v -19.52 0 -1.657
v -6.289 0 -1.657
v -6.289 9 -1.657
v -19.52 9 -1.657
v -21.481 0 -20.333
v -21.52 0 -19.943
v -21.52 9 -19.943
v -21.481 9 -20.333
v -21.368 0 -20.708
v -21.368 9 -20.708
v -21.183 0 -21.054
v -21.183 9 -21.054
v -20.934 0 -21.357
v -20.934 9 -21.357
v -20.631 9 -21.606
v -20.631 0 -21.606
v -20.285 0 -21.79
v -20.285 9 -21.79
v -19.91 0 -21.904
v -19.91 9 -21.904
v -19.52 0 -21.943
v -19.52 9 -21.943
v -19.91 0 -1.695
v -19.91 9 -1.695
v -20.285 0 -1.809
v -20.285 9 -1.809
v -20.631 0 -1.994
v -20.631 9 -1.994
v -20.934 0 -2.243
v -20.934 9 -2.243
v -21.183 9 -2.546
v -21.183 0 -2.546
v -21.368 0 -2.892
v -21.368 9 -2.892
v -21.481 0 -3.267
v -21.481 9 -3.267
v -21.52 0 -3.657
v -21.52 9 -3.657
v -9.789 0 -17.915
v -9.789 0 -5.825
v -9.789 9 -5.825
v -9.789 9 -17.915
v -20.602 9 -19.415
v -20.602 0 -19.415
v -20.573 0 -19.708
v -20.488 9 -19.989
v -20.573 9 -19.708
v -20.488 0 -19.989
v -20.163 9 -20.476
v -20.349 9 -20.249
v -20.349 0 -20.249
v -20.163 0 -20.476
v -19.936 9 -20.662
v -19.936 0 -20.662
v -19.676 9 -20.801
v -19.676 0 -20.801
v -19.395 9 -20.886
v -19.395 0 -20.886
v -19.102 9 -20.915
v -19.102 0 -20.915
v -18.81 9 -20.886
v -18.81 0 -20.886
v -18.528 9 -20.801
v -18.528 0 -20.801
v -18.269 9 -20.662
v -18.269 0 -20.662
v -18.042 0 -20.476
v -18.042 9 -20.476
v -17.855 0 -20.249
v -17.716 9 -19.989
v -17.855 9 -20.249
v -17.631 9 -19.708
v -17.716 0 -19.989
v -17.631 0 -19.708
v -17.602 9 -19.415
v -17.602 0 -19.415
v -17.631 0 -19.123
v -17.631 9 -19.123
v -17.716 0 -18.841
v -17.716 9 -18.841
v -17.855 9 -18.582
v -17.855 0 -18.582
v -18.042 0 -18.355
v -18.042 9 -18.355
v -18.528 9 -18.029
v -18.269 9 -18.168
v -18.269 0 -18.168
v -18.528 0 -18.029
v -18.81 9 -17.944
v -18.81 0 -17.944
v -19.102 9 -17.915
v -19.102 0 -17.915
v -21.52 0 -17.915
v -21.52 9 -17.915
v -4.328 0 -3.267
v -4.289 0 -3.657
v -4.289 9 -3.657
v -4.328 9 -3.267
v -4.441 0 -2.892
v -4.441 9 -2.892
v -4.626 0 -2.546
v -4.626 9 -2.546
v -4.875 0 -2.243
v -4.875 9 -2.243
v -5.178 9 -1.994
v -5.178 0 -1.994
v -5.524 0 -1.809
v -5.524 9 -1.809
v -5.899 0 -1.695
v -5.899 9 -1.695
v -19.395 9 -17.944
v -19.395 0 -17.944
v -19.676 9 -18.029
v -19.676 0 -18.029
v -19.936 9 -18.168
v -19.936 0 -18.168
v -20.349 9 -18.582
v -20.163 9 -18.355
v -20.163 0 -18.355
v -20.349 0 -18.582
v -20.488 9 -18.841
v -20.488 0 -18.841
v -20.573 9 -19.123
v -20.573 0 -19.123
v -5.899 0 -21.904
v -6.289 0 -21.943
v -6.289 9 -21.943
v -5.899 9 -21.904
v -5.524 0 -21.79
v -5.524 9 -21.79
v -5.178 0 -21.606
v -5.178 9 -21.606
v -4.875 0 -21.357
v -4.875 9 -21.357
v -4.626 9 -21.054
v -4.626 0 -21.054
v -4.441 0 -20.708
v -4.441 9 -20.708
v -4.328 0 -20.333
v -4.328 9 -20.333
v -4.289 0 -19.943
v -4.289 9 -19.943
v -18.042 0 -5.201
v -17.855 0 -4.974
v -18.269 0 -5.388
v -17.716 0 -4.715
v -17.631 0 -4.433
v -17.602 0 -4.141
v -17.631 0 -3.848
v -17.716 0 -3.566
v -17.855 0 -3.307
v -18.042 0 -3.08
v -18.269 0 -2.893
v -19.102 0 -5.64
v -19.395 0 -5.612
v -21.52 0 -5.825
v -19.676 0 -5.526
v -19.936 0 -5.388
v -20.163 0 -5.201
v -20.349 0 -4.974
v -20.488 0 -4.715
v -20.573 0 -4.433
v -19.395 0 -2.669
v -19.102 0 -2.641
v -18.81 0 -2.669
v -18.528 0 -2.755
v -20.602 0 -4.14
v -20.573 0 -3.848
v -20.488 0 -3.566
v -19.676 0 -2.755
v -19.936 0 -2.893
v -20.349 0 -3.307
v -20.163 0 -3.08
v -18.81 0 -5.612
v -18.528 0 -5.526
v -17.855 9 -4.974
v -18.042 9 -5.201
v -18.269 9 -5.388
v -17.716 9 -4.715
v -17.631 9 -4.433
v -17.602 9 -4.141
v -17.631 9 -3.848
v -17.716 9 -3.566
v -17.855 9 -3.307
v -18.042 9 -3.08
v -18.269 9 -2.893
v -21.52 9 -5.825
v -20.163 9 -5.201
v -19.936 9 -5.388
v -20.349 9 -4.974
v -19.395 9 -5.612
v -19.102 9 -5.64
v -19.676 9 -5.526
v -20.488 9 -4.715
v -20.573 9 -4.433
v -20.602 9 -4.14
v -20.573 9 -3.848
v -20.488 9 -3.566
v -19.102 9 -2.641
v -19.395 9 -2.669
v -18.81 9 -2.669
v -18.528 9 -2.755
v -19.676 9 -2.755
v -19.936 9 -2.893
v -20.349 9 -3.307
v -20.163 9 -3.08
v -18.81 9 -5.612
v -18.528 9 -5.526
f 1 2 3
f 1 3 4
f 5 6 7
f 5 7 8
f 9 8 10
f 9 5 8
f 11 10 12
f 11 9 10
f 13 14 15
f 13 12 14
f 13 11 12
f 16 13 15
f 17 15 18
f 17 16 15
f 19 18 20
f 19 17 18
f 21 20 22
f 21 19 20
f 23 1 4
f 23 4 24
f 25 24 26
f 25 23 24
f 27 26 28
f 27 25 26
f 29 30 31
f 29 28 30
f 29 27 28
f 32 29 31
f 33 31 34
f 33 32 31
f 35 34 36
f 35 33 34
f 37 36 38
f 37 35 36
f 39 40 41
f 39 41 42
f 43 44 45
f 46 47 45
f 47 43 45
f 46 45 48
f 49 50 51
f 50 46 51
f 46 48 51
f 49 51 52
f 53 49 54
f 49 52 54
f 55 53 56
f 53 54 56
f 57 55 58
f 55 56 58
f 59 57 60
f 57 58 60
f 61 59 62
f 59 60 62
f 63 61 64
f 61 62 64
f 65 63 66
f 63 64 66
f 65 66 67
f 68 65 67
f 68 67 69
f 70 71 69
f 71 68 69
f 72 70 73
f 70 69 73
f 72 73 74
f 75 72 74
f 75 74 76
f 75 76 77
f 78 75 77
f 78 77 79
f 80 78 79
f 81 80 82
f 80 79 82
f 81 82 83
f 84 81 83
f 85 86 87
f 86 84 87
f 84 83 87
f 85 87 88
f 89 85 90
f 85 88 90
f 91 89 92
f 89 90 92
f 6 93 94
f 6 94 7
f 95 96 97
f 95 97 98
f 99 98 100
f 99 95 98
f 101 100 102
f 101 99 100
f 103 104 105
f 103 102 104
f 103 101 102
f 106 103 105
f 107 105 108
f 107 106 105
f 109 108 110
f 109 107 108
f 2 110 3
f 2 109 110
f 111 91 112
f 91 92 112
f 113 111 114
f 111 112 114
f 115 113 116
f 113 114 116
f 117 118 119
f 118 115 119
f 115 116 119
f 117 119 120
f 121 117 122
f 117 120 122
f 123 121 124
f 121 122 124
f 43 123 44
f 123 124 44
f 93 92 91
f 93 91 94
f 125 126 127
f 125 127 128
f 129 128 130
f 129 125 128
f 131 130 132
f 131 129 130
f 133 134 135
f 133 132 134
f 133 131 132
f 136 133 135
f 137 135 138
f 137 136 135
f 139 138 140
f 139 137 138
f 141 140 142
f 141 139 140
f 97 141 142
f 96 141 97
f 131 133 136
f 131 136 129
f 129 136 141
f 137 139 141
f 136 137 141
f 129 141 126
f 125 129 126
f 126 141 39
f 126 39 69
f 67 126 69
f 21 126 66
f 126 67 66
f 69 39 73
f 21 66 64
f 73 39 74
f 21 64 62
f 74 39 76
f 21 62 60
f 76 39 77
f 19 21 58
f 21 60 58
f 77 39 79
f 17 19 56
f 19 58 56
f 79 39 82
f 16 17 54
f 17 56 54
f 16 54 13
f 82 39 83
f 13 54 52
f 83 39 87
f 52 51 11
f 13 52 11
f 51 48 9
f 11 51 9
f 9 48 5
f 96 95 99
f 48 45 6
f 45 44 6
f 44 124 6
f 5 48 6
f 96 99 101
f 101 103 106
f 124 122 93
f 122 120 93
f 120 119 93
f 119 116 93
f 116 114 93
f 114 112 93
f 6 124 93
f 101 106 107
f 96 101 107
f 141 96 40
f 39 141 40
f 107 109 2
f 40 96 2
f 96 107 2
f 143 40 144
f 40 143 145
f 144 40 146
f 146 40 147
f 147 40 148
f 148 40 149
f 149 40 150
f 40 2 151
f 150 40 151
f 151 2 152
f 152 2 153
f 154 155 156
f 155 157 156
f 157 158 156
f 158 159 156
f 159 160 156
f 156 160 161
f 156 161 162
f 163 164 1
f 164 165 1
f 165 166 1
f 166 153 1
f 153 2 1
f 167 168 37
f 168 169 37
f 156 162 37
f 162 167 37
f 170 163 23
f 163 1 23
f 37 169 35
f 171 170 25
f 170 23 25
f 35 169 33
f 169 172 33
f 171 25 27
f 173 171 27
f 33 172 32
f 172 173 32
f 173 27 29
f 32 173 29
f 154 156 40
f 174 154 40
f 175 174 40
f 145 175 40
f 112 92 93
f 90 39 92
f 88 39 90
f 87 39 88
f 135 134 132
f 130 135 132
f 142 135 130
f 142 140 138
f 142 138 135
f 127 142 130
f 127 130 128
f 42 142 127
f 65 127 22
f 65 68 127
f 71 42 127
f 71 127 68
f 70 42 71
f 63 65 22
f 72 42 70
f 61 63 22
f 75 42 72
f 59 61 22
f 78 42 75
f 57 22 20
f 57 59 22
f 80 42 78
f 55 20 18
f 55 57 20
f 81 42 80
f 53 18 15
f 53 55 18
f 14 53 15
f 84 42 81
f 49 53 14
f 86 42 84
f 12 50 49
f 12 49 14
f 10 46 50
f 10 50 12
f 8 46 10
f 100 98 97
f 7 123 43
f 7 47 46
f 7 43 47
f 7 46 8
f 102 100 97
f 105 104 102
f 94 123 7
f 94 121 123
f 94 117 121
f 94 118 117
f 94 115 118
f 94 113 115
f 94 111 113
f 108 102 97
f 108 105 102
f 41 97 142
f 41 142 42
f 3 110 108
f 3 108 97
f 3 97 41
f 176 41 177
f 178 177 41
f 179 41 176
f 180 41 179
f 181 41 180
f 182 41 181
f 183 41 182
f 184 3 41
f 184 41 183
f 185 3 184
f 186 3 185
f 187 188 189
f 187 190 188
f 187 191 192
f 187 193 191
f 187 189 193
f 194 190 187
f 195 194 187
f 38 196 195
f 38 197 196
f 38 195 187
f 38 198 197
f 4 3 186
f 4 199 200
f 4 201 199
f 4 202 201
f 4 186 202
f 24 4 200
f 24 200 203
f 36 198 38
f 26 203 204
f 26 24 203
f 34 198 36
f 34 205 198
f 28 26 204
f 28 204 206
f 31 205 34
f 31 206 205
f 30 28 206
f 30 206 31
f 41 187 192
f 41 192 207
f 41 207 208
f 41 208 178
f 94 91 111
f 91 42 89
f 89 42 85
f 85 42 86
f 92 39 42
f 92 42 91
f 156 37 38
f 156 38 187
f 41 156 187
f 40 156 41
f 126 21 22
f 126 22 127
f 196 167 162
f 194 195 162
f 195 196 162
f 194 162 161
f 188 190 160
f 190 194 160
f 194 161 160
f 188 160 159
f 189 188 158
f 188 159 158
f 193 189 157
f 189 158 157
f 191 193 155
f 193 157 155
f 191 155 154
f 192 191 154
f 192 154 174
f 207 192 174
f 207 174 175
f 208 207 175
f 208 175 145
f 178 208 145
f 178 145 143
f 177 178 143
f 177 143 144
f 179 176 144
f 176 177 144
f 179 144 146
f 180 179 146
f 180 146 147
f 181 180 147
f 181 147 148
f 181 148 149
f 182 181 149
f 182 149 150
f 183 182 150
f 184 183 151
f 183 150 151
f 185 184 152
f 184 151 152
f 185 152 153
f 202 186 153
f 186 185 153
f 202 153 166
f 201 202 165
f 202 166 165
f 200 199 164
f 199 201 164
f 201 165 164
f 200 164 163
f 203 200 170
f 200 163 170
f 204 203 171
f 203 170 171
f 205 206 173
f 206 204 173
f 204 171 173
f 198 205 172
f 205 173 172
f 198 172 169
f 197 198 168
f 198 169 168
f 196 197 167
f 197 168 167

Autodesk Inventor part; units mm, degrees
ref_plane "YZ Plane" through (0, 0, 0) normal (1, 0, 0) x (0, 1, 0)
ref_plane "XZ Plane" through (0, 0, 0) normal (0, 1, 0) x (-1, 0, 0)
ref_plane "XY Plane" through (0, 0, 0) normal (0, 0, 1) x (1, 0, 0)
sketch "Sketch1" plane through (0, 0, 0) normal (0, 1, 0) x (-1, 0, 0)
  spline S0 degree 3 poles (19.0088, -20.3781) (18.4587, -20.3781) (18.0142, -19.9334) (18.0142, -19.3832) (18.0142, -18.833) (18.4587, -18.3883) (19.0088, -18.3883) (19.5594, -18.3883) (20.0038, -18.833) (20.0038, -19.3832) (20.0038, -19.9334) (19.5594, -20.3781) (19.0088, -20.3781) knots 0 0 0 0 1 1 1 2 2 2 3 3 3 4 4 4 4
  line L0 (19.0088, -20.3781) -> (18.4587, -20.3781) construction
  line L1 (18.4587, -20.3781) -> (18.0142, -19.9334) construction
  line L2 (18.0142, -19.9334) -> (18.0142, -19.3832) construction
  line L3 (18.0142, -19.3832) -> (18.0142, -18.833) construction
  line L4 (18.0142, -18.833) -> (18.4587, -18.3883) construction
  line L5 (18.4587, -18.3883) -> (19.0088, -18.3883) construction
  line L6 (19.0088, -18.3883) -> (19.5594, -18.3883) construction
  line L7 (19.5594, -18.3883) -> (20.0038, -18.833) construction
  line L8 (20.0038, -18.833) -> (20.0038, -19.3832) construction
  line L9 (20.0038, -19.3832) -> (20.0038, -19.9334) construction
  line L10 (20.0038, -19.9334) -> (19.5594, -20.3781) construction
  line L11 (19.5594, -20.3781) -> (19.0088, -20.3781) construction
  spline S1 degree 3 poles (19.0088, -20.3781) (18.4587, -20.3781) (18.0142, -19.9334) (18.0142, -19.3832) (18.0142, -18.833) (18.4587, -18.3883) (19.0088, -18.3883) (19.5594, -18.3883) (20.0038, -18.833) (20.0038, -19.3832) (20.0038, -19.9334) (19.5594, -20.3781) (19.0088, -20.3781) knots 0 0 0 0 1 1 1 2 2 2 3 3 3 4 4 4 4
  line L12 (19.0088, -20.3781) -> (18.4587, -20.3781) construction
  line L13 (18.4587, -20.3781) -> (18.0142, -19.9334) construction
  line L14 (18.0142, -19.9334) -> (18.0142, -19.3832) construction
  line L15 (18.0142, -19.3832) -> (18.0142, -18.833) construction
  line L16 (18.0142, -18.833) -> (18.4587, -18.3883) construction
  line L17 (18.4587, -18.3883) -> (19.0088, -18.3883) construction
  line L18 (19.0088, -18.3883) -> (19.5594, -18.3883) construction
  line L19 (19.5594, -18.3883) -> (20.0038, -18.833) construction
  line L20 (20.0038, -18.833) -> (20.0038, -19.3832) construction
  line L21 (20.0038, -19.3832) -> (20.0038, -19.9334) construction
  line L22 (20.0038, -19.9334) -> (19.5594, -20.3781) construction
  line L23 (19.5594, -20.3781) -> (19.0088, -20.3781) construction
  spline S2 degree 3 poles (19.0088, -5.1804) (18.4587, -5.1804) (18.0142, -4.7359) (18.0142, -4.1855) (18.0142, -3.6352) (18.4587, -3.1907) (19.0088, -3.1907) (19.5594, -3.1907) (20.0038, -3.6352) (20.0038, -4.1855) (20.0038, -4.7359) (19.5594, -5.1804) (19.0088, -5.1804) knots 0 0 0 0 1 1 1 2 2 2 3 3 3 4 4 4 4
  line L24 (19.0088, -5.1804) -> (18.4587, -5.1804) construction
  line L25 (18.4587, -5.1804) -> (18.0142, -4.7359) construction
  line L26 (18.0142, -4.7359) -> (18.0142, -4.1855) construction
  line L27 (18.0142, -4.1855) -> (18.0142, -3.6352) construction
  line L28 (18.0142, -3.6352) -> (18.4587, -3.1907) construction
  line L29 (18.4587, -3.1907) -> (19.0088, -3.1907) construction
  line L30 (19.0088, -3.1907) -> (19.5594, -3.1907) construction
  line L31 (19.5594, -3.1907) -> (20.0038, -3.6352) construction
  line L32 (20.0038, -3.6352) -> (20.0038, -4.1855) construction
  line L33 (20.0038, -4.1855) -> (20.0038, -4.7359) construction
  line L34 (20.0038, -4.7359) -> (19.5594, -5.1804) construction
  line L35 (19.5594, -5.1804) -> (19.0088, -5.1804) construction
  spline S3 degree 3 poles (19.0088, -5.1804) (18.4587, -5.1804) (18.0142, -4.7359) (18.0142, -4.1855) (18.0142, -3.6352) (18.4587, -3.1907) (19.0088, -3.1907) (19.5594, -3.1907) (20.0038, -3.6352) (20.0038, -4.1855) (20.0038, -4.7359) (19.5594, -5.1804) (19.0088, -5.1804) knots 0 0 0 0 1 1 1 2 2 2 3 3 3 4 4 4 4
  line L36 (19.0088, -5.1804) -> (18.4587, -5.1804) construction
  line L37 (18.4587, -5.1804) -> (18.0142, -4.7359) construction
  line L38 (18.0142, -4.7359) -> (18.0142, -4.1855) construction
  line L39 (18.0142, -4.1855) -> (18.0142, -3.6352) construction
  line L40 (18.0142, -3.6352) -> (18.4587, -3.1907) construction
  line L41 (18.4587, -3.1907) -> (19.0088, -3.1907) construction
  line L42 (19.0088, -3.1907) -> (19.5594, -3.1907) construction
  line L43 (19.5594, -3.1907) -> (20.0038, -3.6352) construction
  line L44 (20.0038, -3.6352) -> (20.0038, -4.1855) construction
  line L45 (20.0038, -4.1855) -> (20.0038, -4.7359) construction
  line L46 (20.0038, -4.7359) -> (19.5594, -5.1804) construction
  line L47 (19.5594, -5.1804) -> (19.0088, -5.1804) construction
  line L48 (19.0302, -21.9233) -> (19.4746, -21.9019)
  spline S4 degree 3 poles (19.4746, -21.9019) (20.5647, -21.6366) (21.3157, -20.9538) (21.5279, -19.8276) knots 1 1 1 1 2 2 2 2
  line L49 (19.4746, -21.9019) -> (20.5647, -21.6366) construction
  line L50 (20.5647, -21.6366) -> (21.3157, -20.9538) construction
  line L51 (21.3157, -20.9538) -> (21.5279, -19.8276) construction
  line L52 (21.5279, -19.8276) -> (21.5703, -19.4042)
  line L53 (21.5703, -19.4042) -> (21.5703, -4.1855)
  line L54 (21.5703, -4.1855) -> (21.5279, -3.7411)
  spline S5 degree 3 poles (21.5279, -3.7411) (21.3143, -2.6778) (20.5474, -1.8728) (19.4746, -1.6878) knots 5 5 5 5 6 6 6 6
  line L55 (21.5279, -3.7411) -> (21.3143, -2.6778) construction
  line L56 (21.3143, -2.6778) -> (20.5474, -1.8728) construction
  line L57 (20.5474, -1.8728) -> (19.4746, -1.6878) construction
  line L58 (19.4746, -1.6878) -> (19.0302, -1.6456)
  line L59 (19.0302, -1.6456) -> (3.8115, -1.6456)
  line L60 (3.8115, -1.6456) -> (3.3881, -1.6878)
  spline S6 degree 3 poles (3.3881, -1.6878) (2.3177, -1.8298) (1.536, -2.7195) (1.3138, -3.7411) knots 9 9 9 9 10 10 10 10
  line L61 (3.3881, -1.6878) -> (2.3177, -1.8298) construction
  line L62 (2.3177, -1.8298) -> (1.536, -2.7195) construction
  line L63 (1.536, -2.7195) -> (1.3138, -3.7411) construction
  line L64 (1.3138, -3.7411) -> (1.2924, -4.1855)
  line L65 (1.2924, -4.1855) -> (1.2924, -19.4042)
  line L66 (1.2924, -19.4042) -> (1.3138, -19.8276)
  spline S7 degree 3 poles (1.3138, -19.8276) (1.5308, -20.908) (2.308, -21.6852) (3.3881, -21.9019) knots 13 13 13 13 14 14 14 14
  line L67 (1.3138, -19.8276) -> (1.5308, -20.908) construction
  line L68 (1.5308, -20.908) -> (2.308, -21.6852) construction
  line L69 (2.308, -21.6852) -> (3.3881, -21.9019) construction
  line L70 (3.3881, -21.9019) -> (3.8115, -21.9233)
  line L71 (3.8115, -21.9233) -> (19.0302, -21.9233)
  point P0 (0, 0)
sketch "Sketch2" plane through (0, 0, 0) normal (0, 1, 0) x (-1, 0, 0)
  line L0 (19.5198, -21.9426) -> (6.2891, -21.9426)
  line L1 (4.2891, -19.9426) -> (4.2891, -3.657)
  line L2 (6.2891, -1.657) -> (19.5198, -1.657)
  line L3 (21.5198, -3.657) -> (21.5198, -19.9426)
  arc A0 (21.5198, -3.657) -> (19.5198, -1.657) centre (19.5198, -3.657) ccw
  arc A1 (19.5198, -21.9426) -> (21.5198, -19.9426) centre (19.5198, -19.9426) ccw
  arc A2 (4.2891, -19.9426) -> (6.2891, -21.9426) centre (6.2891, -19.9426) ccw
  arc A3 (6.2891, -1.657) -> (4.2891, -3.657) centre (6.2891, -3.657) ccw
  circle A4 centre (19.1022, -4.1405) radius 1.5
  circle A5 centre (19.1022, -19.4152) radius 1.5
  line L4 (21.5198, -5.825) -> (9.7891, -5.825)
  line L5 (9.7891, -5.825) -> (9.7891, -17.9152)
  line L6 (9.7891, -17.9152) -> (21.5198, -17.9152)
  point P0 (0, 0)
  dimension "d0" = 2
  dimension "d1" = 3
  dimension "d2" = 3
extrude "Extrusion1" add sketch "Sketch2" along normal blind 9 contours L0 A2 L1 A3 L2 A0 L3 L4 L5 L6 A1
properties part number "thermo-model"
